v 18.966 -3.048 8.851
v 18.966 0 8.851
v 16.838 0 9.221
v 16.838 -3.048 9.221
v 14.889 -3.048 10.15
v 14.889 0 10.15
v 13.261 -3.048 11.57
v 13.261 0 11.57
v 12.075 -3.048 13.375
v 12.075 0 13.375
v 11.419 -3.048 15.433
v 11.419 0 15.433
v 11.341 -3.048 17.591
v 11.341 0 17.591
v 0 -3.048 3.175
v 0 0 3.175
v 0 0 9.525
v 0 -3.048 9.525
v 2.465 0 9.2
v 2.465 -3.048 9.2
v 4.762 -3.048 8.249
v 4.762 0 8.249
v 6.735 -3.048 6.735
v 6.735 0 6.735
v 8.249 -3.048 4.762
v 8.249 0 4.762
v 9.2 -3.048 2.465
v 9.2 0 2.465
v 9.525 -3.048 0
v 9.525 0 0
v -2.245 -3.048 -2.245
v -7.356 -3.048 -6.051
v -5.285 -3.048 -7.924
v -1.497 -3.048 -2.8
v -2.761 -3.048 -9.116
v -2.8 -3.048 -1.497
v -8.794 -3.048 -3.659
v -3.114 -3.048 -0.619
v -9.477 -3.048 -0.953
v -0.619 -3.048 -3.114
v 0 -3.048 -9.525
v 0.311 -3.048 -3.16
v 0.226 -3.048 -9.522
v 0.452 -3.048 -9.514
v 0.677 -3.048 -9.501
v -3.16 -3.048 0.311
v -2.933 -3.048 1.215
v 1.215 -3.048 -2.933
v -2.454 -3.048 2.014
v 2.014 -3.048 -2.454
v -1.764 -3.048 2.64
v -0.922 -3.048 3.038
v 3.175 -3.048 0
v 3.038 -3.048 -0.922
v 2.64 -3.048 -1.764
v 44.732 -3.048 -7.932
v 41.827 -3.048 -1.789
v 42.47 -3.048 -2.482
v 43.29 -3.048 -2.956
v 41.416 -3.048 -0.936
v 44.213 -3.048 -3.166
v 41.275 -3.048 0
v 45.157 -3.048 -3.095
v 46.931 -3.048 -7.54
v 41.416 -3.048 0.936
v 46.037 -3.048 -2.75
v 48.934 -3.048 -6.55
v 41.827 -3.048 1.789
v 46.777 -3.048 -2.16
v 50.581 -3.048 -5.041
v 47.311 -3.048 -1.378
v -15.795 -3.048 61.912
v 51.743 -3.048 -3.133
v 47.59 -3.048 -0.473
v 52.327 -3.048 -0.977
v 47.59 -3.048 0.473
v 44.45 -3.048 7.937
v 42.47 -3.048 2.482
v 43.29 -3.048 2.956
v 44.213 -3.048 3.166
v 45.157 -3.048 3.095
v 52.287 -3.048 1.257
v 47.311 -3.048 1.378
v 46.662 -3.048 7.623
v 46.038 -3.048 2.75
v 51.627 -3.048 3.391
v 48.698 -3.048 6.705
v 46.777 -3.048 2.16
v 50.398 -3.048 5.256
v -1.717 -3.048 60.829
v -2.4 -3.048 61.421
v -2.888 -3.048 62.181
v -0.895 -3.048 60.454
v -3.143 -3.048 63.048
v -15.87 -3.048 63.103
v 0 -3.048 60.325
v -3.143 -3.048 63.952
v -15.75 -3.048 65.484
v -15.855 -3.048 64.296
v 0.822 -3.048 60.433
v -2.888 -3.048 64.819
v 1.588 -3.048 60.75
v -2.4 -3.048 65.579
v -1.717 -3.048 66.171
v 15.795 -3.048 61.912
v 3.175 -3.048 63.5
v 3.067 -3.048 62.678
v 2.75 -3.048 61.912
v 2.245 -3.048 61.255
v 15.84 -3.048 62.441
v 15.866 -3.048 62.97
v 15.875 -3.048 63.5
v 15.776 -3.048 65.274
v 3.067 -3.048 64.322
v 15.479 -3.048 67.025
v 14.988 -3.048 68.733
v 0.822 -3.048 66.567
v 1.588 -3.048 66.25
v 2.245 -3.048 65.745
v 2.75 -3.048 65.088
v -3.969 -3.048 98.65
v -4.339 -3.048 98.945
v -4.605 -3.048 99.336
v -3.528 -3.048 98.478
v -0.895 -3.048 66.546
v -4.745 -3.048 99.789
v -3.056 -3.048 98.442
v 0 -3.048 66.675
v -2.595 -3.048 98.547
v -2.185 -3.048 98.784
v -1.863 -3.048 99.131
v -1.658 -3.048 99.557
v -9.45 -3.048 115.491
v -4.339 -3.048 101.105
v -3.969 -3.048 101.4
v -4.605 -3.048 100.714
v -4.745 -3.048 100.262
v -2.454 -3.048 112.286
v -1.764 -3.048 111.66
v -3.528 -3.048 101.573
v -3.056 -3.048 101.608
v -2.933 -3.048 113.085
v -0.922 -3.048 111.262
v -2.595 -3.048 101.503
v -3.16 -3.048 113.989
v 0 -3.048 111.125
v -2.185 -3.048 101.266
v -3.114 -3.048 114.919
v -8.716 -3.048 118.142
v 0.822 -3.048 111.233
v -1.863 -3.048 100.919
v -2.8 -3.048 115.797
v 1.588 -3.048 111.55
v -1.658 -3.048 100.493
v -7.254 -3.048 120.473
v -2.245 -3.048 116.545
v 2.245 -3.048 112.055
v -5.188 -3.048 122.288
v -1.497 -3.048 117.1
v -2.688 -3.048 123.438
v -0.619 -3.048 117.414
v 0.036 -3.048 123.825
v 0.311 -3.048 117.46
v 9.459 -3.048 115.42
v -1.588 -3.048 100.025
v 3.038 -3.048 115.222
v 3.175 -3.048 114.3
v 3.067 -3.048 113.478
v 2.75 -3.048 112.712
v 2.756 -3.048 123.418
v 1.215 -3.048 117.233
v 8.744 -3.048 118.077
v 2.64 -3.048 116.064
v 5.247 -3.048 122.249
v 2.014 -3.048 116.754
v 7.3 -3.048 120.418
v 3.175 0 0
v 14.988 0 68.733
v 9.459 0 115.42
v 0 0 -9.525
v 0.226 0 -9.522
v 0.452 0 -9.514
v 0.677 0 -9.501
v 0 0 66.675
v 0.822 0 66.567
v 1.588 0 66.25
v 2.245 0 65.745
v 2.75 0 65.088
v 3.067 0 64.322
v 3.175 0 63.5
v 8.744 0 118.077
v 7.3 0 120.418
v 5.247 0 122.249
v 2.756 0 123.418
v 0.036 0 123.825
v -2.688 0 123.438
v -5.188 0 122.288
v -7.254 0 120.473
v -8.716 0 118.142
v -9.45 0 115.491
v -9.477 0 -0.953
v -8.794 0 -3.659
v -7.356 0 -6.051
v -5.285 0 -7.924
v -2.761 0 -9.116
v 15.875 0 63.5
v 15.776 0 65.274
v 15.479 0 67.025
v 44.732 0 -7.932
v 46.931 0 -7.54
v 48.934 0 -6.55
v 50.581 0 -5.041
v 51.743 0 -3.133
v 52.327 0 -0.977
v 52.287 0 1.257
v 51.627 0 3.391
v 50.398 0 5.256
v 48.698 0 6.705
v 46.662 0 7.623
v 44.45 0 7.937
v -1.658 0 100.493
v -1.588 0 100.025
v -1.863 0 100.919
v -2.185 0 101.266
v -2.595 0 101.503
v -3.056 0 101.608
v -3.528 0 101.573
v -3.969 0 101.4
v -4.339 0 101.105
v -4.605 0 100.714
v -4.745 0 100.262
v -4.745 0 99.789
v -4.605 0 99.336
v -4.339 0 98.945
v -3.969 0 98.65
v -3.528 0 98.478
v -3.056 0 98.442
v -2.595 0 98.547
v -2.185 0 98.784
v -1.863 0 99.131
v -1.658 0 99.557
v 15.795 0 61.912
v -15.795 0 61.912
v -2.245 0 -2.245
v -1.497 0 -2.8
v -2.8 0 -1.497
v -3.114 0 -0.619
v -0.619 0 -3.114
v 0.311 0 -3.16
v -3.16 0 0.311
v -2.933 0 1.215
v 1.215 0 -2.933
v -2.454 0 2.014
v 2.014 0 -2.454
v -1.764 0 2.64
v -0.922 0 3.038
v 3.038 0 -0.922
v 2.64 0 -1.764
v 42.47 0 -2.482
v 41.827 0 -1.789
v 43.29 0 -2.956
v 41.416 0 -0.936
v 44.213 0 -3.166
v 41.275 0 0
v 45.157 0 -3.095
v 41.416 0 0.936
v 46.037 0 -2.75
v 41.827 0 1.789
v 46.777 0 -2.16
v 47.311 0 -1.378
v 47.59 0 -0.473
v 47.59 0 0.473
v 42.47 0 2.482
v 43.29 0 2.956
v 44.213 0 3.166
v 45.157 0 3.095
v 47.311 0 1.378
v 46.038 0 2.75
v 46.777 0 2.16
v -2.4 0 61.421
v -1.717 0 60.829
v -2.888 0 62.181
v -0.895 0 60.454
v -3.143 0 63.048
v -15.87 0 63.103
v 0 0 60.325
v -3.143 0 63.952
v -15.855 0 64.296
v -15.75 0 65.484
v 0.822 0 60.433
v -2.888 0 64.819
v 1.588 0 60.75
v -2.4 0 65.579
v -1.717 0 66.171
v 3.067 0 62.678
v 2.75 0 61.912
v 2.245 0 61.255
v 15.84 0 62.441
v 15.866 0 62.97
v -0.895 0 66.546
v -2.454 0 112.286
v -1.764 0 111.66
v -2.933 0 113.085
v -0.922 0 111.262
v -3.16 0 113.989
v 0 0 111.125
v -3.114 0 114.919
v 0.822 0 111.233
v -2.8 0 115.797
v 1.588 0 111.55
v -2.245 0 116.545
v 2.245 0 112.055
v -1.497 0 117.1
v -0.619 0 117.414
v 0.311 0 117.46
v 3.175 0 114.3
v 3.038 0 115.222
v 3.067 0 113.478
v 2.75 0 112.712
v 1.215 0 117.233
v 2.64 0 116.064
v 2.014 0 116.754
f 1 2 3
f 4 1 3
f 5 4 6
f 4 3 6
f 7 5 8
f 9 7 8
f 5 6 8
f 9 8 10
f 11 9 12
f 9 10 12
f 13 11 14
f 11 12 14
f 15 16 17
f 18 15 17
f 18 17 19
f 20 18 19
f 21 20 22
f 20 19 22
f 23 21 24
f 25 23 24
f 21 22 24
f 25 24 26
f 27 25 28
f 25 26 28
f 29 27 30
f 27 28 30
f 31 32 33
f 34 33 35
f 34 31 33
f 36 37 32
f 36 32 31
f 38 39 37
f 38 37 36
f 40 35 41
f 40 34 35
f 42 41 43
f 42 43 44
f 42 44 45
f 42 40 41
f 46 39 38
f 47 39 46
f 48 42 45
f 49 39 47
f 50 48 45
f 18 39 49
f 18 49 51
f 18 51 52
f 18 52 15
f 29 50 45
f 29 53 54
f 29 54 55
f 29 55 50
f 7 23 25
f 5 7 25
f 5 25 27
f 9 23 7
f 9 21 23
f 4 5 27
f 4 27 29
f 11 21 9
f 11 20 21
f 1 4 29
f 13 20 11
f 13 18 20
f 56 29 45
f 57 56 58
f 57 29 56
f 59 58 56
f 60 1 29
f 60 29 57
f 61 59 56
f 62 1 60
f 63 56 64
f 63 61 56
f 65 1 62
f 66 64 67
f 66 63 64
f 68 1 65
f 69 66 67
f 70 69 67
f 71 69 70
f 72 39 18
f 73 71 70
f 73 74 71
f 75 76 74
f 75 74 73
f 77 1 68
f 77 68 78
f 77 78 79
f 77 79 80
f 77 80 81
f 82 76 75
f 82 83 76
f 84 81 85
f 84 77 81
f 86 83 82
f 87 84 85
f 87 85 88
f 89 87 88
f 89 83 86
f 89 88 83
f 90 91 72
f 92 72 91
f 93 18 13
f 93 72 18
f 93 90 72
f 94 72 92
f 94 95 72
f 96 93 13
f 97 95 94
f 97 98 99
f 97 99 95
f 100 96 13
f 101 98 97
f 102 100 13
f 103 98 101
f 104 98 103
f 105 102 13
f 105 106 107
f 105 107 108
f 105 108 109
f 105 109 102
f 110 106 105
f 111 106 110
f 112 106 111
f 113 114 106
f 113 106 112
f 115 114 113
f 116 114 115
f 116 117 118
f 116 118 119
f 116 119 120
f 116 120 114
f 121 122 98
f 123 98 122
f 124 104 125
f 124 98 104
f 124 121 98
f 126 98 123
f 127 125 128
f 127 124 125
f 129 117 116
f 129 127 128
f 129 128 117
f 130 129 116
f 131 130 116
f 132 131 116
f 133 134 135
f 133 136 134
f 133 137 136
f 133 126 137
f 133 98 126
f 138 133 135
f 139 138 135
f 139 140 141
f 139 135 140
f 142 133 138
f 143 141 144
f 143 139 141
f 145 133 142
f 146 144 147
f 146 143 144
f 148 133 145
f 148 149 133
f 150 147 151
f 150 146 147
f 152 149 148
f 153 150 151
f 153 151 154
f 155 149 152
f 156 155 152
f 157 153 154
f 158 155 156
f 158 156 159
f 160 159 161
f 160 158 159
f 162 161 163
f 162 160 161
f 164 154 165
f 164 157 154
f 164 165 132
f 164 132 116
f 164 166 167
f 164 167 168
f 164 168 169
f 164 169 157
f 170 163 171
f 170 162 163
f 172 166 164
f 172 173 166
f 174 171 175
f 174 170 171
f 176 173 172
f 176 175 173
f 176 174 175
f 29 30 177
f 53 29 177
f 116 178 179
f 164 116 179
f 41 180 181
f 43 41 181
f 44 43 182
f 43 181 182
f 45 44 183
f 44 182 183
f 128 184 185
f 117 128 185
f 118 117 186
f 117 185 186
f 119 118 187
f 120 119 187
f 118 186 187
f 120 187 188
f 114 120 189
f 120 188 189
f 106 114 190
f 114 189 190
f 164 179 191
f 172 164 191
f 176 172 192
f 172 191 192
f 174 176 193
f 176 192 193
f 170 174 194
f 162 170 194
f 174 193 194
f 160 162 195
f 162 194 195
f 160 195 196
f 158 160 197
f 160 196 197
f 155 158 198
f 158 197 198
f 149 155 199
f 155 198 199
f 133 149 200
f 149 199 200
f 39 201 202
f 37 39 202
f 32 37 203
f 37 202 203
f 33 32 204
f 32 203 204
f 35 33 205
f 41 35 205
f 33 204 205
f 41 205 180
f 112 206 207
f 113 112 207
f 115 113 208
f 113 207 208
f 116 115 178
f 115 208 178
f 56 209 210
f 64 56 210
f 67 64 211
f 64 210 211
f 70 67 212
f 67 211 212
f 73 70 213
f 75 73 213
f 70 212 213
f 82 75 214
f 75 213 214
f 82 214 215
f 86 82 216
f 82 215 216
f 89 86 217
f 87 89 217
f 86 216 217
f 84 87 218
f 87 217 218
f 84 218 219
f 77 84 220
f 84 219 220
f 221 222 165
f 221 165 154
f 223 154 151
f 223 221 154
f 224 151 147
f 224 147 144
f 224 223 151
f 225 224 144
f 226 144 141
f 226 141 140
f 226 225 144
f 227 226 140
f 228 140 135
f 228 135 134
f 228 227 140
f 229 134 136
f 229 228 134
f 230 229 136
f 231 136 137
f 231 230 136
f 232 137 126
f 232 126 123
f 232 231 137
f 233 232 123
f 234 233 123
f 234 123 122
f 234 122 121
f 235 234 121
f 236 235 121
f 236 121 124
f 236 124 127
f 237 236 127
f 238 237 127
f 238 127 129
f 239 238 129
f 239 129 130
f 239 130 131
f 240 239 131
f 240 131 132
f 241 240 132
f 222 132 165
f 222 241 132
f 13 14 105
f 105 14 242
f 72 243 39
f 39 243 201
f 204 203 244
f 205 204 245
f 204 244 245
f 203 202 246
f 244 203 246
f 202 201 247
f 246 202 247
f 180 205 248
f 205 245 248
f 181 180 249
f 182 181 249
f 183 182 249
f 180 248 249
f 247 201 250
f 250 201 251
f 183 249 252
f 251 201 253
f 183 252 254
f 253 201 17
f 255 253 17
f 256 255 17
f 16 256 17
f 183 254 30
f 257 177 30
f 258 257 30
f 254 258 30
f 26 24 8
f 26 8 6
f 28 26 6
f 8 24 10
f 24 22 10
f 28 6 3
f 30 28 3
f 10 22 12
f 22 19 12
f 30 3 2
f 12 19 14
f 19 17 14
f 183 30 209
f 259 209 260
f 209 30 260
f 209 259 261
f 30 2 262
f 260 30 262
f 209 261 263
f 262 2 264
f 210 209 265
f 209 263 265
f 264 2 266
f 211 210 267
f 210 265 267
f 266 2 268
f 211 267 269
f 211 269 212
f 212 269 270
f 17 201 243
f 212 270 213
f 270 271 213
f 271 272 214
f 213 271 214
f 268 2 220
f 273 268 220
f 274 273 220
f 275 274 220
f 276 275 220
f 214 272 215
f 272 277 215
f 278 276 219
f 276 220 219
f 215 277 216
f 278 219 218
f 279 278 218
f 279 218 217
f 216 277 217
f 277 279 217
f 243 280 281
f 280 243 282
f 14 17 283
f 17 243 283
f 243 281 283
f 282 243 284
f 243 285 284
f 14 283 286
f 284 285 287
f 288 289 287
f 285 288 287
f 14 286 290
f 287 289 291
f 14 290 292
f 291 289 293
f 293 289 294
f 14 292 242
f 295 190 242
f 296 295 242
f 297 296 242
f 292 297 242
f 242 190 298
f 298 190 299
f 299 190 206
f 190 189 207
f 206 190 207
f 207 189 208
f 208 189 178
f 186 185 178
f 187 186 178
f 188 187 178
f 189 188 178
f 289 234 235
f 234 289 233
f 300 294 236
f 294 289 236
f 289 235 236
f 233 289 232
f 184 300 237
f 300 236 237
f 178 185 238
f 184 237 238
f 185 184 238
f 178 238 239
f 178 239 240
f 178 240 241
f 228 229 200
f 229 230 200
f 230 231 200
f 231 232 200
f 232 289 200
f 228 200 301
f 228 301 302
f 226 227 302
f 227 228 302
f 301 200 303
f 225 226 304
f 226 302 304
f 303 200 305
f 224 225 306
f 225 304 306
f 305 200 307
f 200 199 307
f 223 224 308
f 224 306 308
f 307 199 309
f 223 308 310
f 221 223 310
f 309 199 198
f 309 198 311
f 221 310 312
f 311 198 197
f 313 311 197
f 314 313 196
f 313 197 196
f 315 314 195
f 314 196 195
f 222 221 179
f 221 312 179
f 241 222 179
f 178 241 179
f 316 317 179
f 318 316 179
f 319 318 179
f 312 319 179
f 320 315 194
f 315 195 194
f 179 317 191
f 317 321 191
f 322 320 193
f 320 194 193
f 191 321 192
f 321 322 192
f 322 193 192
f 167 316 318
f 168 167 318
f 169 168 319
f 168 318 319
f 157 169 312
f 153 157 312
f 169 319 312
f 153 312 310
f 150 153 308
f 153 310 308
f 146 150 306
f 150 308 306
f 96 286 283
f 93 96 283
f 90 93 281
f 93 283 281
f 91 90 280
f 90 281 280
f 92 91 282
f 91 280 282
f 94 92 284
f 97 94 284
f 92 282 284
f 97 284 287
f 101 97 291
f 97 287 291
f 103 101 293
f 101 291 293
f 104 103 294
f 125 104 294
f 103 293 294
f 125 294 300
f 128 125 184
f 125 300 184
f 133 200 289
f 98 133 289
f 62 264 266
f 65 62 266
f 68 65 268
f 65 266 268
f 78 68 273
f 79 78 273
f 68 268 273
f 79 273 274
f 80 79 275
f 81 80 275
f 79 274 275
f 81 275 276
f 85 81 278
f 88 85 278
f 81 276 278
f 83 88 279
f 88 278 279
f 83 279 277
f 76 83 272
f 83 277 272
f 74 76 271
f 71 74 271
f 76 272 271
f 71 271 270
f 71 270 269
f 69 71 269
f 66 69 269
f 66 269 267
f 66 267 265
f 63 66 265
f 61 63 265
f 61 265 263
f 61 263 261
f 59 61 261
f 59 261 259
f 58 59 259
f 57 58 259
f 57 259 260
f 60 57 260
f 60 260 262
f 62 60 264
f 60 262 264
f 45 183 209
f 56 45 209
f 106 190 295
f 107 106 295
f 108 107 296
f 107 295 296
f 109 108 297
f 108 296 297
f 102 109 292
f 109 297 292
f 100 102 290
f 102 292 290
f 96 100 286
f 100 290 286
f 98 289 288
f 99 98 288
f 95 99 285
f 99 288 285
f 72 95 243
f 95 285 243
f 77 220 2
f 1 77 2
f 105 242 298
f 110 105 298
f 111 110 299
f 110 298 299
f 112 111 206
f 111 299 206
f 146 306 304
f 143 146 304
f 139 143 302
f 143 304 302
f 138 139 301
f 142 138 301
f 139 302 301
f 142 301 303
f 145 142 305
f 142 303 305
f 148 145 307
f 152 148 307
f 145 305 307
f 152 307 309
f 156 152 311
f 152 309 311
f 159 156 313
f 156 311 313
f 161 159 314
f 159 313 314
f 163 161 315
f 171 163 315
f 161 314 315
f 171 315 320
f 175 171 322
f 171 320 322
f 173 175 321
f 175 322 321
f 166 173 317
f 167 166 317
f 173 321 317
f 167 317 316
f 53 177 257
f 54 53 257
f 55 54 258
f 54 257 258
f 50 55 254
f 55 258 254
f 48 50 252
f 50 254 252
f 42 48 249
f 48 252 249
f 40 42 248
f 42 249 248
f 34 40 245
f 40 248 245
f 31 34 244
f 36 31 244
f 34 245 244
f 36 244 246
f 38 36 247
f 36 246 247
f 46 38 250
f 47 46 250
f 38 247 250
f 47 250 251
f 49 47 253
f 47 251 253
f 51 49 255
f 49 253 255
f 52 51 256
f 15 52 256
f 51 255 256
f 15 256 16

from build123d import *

# Parameters (mm, degrees)
F0_R     = 1.5875
F1_DEPTH = 3.048


with BuildPart() as f1:
    # F0 (on Front) → F1 (new body)
    with BuildSketch(Plane.XZ):
        with BuildLine():
            Line((9.525, 0), (3.175, 0))
            ThreePointArc((3.175, 0), (-2.2450640303, -2.2450640303), (0, 3.175))
            Line((0, 3.175), (0, 9.525))
            ThreePointArc((0, 9.525), (-7.063929059, 6.3895642457), (-9.4772553384, -0.9525))
            ThreePointArc((-9.4772553384, -0.9525), (-6.3895642457, -7.063929059), (0, -9.525))
            Line((0, -9.525), (0.6773435479, -9.500885786))
            ThreePointArc((0.6773435479, -9.500885786), (6.9705567315, -6.4912990883), (9.525, 0))
        make_face()
        with BuildLine():
            ThreePointArc((0, 9.525), (6.7351920908, 6.7351920908), (9.525, 0))
            Line((9.525, 0), (36.5125, 0))
            ThreePointArc((36.5125, 0), (38.8373399243, 5.6126600757), (44.45, 7.9375))
            Line((44.45, 7.9375), (18.9664742022, 8.8511343208))
            ThreePointArc((18.9664742022, 8.8511343208), (13.260685791, 11.5695707689), (11.3409723165, 17.5912497948))
            Line((11.3409723165, 17.5912497948), (15.7954255641, 61.9125))
            ThreePointArc((15.7954255641, 61.9125), (10.6492737428, 51.7267849017), (0, 47.625))
            Line((0, 47.625), (0, 9.525))
        make_face()
        with BuildLine():
            Line((36.5125, 0), (9.525, 0))
            ThreePointArc((9.525, 0), (6.9705567315, -6.4912990883), (0.6773435479, -9.500885786))
            Line((0.6773435479, -9.500885786), (44.7324052746, -7.9324746146))
            ThreePointArc((44.7324052746, -7.9324746146), (38.9380895153, -5.7116327839), (36.5125, 0))
        make_face()
        with BuildLine():
            ThreePointArc((-9.4772553384, -0.9525), (-7.063929059, 6.3895642457), (0, 9.525))
            Line((0, 9.525), (0, 47.625))
            ThreePointArc((0, 47.625), (-10.6492737428, 51.7267849017), (-15.7954255641, 61.9125))
            Line((-15.7954255641, 61.9125), (-9.4772553384, -0.9525))
        make_face()
        with BuildLine():
            ThreePointArc((44.45, 7.9375), (38.8373399243, 5.6126600757), (36.5125, 0))
            ThreePointArc((36.5125, 0), (38.9380895153, -5.7116327839), (44.7324052746, -7.9324746146))
            ThreePointArc((44.7324052746, -7.9324746146), (50.1616327839, -5.5119104847), (52.3875, 0))
            ThreePointArc((52.3875, 0), (50.0626600757, 5.6126600757), (44.45, 7.9375))
        make_face()
        with BuildLine():
            ThreePointArc((47.625, 0), (44.45, -3.175), (41.275, 0))
            ThreePointArc((41.275, 0), (44.45, 3.175), (47.625, 0))
        make_face(mode=Mode.SUBTRACT)
        with BuildLine():
            ThreePointArc((0, -9.525), (0.3388863295, -9.5189695375), (0.6773435479, -9.500885786))
            Line((0.6773435479, -9.500885786), (0, -9.525))
        make_face()
        with BuildLine():
            Line((0, 60.325), (0, 47.625))
            ThreePointArc((0, 47.625), (10.6492737428, 51.7267849017), (15.7954255641, 61.9125))
            Line((15.7954255641, 61.9125), (14.9877324754, 68.7329246359))
            ThreePointArc((14.9877324754, 68.7329246359), (9.1908363712, 76.4438847259), (0, 79.375))
            Line((0, 79.375), (0, 66.675))
            ThreePointArc((0, 66.675), (2.2450640303, 65.7450640303), (3.175, 63.5))
            ThreePointArc((3.175, 63.5), (2.2450640303, 61.2549359697), (0, 60.325))
        make_face()
        with BuildLine():
            ThreePointArc((-15.7954255641, 61.9125), (-10.6492737428, 51.7267849017), (0, 47.625))
            Line((0, 47.625), (0, 60.325))
            ThreePointArc((0, 60.325), (-3.175, 63.5), (0, 66.675))
            Line((0, 66.675), (0, 79.375))
            ThreePointArc((0, 79.375), (-10.5003255158, 75.40625), (-15.7504882737, 65.484375))
            ThreePointArc((-15.7504882737, 65.484375), (-15.8737438155, 63.6997054867), (-15.7954255641, 61.9125))
        make_face()
        with BuildLine():
            Line((14.9877324754, 68.7329246359), (15.7954255641, 61.9125))
            ThreePointArc((15.7954255641, 61.9125), (15.8550939106, 62.7052534459), (15.875, 63.5))
            ThreePointArc((15.875, 63.5), (15.6516113875, 66.1538059417), (14.9877324754, 68.7329246359))
        make_face()
        with BuildLine():
            Line((-9.4502929642, 115.490625), (-15.7504882737, 65.484375))
            ThreePointArc((-15.7504882737, 65.484375), (-10.5003255158, 75.40625), (0, 79.375))
            Line((0, 79.375), (0, 104.775))
            ThreePointArc((0, 104.775), (-7.14375, 107.9998046905), (-9.4502929642, 115.490625))
        make_face()
        with Locations((-3.175, 100.0252)):
            Circle(F0_R, mode=Mode.SUBTRACT)
        with BuildLine():
            ThreePointArc((0, 79.375), (9.1908363712, 76.4438847259), (14.9877324754, 68.7329246359))
            Line((14.9877324754, 68.7329246359), (9.4589053806, 115.4201490977))
            ThreePointArc((9.4589053806, 115.4201490977), (9.5084619879, 114.8610486832), (9.525, 114.3))
            ThreePointArc((9.525, 114.3), (6.7351920908, 107.5648079092), (0, 104.775))
            Line((0, 104.775), (0, 79.375))
        make_face()
        with BuildLine():
            ThreePointArc((9.4589053806, 115.4201490977), (0.0355000934, 123.8249338446), (-9.4502929642, 115.490625))
            ThreePointArc((-9.4502929642, 115.490625), (-7.14375, 107.9998046905), (0, 104.775))
            ThreePointArc((0, 104.775), (6.7351920908, 107.5648079092), (9.525, 114.3))
            ThreePointArc((9.525, 114.3), (9.5084619879, 114.8610486832), (9.4589053806, 115.4201490977))
        make_face()
        with BuildLine():
            ThreePointArc((3.175, 114.3), (2.2450640303, 112.0549359697), (0, 111.125))
            ThreePointArc((0, 111.125), (-2.2450640303, 116.5450640303), (3.175, 114.3))
        make_face(mode=Mode.SUBTRACT)
    extrude(amount=F1_DEPTH)


solid = f1.part
